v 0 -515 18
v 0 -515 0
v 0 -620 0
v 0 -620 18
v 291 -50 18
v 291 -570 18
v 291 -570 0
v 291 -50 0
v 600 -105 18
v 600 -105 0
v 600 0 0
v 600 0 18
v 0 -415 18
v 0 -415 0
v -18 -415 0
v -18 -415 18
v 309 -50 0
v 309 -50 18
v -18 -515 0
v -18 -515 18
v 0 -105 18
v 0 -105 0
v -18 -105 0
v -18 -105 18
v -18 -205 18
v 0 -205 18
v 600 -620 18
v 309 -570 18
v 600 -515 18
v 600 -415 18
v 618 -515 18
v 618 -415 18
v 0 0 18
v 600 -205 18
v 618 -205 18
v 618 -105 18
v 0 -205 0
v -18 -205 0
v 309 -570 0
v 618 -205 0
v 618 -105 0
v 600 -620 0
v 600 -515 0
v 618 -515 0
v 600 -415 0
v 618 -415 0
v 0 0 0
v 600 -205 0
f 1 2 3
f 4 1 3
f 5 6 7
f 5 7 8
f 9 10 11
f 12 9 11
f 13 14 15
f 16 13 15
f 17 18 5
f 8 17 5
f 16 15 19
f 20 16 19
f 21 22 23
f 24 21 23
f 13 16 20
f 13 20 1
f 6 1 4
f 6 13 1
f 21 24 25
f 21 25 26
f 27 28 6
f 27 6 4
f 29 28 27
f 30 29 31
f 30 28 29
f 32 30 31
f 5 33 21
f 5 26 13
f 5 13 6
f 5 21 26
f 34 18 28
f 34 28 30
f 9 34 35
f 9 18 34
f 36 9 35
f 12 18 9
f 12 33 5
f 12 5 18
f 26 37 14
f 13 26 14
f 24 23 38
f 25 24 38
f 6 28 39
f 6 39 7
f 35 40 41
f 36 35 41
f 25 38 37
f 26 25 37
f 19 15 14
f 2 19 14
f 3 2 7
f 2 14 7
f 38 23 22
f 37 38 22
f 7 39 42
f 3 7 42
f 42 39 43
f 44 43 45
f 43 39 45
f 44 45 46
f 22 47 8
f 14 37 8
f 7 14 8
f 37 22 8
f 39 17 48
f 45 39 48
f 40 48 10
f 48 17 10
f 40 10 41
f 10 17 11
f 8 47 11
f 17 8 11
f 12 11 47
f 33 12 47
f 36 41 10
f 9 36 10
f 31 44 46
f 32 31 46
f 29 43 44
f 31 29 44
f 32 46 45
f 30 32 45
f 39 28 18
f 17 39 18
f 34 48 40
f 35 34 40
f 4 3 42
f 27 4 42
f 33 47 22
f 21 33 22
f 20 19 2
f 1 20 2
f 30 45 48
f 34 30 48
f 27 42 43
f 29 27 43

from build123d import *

# Parameters (mm, degrees)
BOSS_EXTRUDE3_DEPTH     = 18
CUT_EXTRUDE1_DEPTH      = 876.584376288
CUT_EXTRUDE1_DEPTH_BACK = 876.584376288
SKETCH2_W               = 18
SKETCH2_H               = 520


with BuildPart() as part:
    # Sketch1 → Boss-Extrude3 (new body)
    with BuildSketch(Plane.XY):
        Polygon((0, 0), (0, -105), (-18, -105), (-18, -205), (0, -205), (0, -415), (-18, -415), (-18, -515), (0, -515), (0, -620), (600, -620), (600, -515), (618, -515), (618, -415), (600, -415), (600, -205), (618, -205), (618, -105), (600, -105), (600, 0), align=None)
    extrude(amount=BOSS_EXTRUDE3_DEPTH)

    # Sketch2 → Cut-Extrude1 (cut, two sides: drawn at the far end of the back side and taken through both)
    with BuildSketch(Plane(origin=(0, 0, 0), x_dir=(-1, 0, 0), z_dir=(0, 0, -1)).offset(-CUT_EXTRUDE1_DEPTH_BACK)):
        with Locations((-300, -310)):
            Rectangle(SKETCH2_W, SKETCH2_H)
    extrude(amount=CUT_EXTRUDE1_DEPTH + CUT_EXTRUDE1_DEPTH_BACK, mode=Mode.SUBTRACT)


solid = part.part
